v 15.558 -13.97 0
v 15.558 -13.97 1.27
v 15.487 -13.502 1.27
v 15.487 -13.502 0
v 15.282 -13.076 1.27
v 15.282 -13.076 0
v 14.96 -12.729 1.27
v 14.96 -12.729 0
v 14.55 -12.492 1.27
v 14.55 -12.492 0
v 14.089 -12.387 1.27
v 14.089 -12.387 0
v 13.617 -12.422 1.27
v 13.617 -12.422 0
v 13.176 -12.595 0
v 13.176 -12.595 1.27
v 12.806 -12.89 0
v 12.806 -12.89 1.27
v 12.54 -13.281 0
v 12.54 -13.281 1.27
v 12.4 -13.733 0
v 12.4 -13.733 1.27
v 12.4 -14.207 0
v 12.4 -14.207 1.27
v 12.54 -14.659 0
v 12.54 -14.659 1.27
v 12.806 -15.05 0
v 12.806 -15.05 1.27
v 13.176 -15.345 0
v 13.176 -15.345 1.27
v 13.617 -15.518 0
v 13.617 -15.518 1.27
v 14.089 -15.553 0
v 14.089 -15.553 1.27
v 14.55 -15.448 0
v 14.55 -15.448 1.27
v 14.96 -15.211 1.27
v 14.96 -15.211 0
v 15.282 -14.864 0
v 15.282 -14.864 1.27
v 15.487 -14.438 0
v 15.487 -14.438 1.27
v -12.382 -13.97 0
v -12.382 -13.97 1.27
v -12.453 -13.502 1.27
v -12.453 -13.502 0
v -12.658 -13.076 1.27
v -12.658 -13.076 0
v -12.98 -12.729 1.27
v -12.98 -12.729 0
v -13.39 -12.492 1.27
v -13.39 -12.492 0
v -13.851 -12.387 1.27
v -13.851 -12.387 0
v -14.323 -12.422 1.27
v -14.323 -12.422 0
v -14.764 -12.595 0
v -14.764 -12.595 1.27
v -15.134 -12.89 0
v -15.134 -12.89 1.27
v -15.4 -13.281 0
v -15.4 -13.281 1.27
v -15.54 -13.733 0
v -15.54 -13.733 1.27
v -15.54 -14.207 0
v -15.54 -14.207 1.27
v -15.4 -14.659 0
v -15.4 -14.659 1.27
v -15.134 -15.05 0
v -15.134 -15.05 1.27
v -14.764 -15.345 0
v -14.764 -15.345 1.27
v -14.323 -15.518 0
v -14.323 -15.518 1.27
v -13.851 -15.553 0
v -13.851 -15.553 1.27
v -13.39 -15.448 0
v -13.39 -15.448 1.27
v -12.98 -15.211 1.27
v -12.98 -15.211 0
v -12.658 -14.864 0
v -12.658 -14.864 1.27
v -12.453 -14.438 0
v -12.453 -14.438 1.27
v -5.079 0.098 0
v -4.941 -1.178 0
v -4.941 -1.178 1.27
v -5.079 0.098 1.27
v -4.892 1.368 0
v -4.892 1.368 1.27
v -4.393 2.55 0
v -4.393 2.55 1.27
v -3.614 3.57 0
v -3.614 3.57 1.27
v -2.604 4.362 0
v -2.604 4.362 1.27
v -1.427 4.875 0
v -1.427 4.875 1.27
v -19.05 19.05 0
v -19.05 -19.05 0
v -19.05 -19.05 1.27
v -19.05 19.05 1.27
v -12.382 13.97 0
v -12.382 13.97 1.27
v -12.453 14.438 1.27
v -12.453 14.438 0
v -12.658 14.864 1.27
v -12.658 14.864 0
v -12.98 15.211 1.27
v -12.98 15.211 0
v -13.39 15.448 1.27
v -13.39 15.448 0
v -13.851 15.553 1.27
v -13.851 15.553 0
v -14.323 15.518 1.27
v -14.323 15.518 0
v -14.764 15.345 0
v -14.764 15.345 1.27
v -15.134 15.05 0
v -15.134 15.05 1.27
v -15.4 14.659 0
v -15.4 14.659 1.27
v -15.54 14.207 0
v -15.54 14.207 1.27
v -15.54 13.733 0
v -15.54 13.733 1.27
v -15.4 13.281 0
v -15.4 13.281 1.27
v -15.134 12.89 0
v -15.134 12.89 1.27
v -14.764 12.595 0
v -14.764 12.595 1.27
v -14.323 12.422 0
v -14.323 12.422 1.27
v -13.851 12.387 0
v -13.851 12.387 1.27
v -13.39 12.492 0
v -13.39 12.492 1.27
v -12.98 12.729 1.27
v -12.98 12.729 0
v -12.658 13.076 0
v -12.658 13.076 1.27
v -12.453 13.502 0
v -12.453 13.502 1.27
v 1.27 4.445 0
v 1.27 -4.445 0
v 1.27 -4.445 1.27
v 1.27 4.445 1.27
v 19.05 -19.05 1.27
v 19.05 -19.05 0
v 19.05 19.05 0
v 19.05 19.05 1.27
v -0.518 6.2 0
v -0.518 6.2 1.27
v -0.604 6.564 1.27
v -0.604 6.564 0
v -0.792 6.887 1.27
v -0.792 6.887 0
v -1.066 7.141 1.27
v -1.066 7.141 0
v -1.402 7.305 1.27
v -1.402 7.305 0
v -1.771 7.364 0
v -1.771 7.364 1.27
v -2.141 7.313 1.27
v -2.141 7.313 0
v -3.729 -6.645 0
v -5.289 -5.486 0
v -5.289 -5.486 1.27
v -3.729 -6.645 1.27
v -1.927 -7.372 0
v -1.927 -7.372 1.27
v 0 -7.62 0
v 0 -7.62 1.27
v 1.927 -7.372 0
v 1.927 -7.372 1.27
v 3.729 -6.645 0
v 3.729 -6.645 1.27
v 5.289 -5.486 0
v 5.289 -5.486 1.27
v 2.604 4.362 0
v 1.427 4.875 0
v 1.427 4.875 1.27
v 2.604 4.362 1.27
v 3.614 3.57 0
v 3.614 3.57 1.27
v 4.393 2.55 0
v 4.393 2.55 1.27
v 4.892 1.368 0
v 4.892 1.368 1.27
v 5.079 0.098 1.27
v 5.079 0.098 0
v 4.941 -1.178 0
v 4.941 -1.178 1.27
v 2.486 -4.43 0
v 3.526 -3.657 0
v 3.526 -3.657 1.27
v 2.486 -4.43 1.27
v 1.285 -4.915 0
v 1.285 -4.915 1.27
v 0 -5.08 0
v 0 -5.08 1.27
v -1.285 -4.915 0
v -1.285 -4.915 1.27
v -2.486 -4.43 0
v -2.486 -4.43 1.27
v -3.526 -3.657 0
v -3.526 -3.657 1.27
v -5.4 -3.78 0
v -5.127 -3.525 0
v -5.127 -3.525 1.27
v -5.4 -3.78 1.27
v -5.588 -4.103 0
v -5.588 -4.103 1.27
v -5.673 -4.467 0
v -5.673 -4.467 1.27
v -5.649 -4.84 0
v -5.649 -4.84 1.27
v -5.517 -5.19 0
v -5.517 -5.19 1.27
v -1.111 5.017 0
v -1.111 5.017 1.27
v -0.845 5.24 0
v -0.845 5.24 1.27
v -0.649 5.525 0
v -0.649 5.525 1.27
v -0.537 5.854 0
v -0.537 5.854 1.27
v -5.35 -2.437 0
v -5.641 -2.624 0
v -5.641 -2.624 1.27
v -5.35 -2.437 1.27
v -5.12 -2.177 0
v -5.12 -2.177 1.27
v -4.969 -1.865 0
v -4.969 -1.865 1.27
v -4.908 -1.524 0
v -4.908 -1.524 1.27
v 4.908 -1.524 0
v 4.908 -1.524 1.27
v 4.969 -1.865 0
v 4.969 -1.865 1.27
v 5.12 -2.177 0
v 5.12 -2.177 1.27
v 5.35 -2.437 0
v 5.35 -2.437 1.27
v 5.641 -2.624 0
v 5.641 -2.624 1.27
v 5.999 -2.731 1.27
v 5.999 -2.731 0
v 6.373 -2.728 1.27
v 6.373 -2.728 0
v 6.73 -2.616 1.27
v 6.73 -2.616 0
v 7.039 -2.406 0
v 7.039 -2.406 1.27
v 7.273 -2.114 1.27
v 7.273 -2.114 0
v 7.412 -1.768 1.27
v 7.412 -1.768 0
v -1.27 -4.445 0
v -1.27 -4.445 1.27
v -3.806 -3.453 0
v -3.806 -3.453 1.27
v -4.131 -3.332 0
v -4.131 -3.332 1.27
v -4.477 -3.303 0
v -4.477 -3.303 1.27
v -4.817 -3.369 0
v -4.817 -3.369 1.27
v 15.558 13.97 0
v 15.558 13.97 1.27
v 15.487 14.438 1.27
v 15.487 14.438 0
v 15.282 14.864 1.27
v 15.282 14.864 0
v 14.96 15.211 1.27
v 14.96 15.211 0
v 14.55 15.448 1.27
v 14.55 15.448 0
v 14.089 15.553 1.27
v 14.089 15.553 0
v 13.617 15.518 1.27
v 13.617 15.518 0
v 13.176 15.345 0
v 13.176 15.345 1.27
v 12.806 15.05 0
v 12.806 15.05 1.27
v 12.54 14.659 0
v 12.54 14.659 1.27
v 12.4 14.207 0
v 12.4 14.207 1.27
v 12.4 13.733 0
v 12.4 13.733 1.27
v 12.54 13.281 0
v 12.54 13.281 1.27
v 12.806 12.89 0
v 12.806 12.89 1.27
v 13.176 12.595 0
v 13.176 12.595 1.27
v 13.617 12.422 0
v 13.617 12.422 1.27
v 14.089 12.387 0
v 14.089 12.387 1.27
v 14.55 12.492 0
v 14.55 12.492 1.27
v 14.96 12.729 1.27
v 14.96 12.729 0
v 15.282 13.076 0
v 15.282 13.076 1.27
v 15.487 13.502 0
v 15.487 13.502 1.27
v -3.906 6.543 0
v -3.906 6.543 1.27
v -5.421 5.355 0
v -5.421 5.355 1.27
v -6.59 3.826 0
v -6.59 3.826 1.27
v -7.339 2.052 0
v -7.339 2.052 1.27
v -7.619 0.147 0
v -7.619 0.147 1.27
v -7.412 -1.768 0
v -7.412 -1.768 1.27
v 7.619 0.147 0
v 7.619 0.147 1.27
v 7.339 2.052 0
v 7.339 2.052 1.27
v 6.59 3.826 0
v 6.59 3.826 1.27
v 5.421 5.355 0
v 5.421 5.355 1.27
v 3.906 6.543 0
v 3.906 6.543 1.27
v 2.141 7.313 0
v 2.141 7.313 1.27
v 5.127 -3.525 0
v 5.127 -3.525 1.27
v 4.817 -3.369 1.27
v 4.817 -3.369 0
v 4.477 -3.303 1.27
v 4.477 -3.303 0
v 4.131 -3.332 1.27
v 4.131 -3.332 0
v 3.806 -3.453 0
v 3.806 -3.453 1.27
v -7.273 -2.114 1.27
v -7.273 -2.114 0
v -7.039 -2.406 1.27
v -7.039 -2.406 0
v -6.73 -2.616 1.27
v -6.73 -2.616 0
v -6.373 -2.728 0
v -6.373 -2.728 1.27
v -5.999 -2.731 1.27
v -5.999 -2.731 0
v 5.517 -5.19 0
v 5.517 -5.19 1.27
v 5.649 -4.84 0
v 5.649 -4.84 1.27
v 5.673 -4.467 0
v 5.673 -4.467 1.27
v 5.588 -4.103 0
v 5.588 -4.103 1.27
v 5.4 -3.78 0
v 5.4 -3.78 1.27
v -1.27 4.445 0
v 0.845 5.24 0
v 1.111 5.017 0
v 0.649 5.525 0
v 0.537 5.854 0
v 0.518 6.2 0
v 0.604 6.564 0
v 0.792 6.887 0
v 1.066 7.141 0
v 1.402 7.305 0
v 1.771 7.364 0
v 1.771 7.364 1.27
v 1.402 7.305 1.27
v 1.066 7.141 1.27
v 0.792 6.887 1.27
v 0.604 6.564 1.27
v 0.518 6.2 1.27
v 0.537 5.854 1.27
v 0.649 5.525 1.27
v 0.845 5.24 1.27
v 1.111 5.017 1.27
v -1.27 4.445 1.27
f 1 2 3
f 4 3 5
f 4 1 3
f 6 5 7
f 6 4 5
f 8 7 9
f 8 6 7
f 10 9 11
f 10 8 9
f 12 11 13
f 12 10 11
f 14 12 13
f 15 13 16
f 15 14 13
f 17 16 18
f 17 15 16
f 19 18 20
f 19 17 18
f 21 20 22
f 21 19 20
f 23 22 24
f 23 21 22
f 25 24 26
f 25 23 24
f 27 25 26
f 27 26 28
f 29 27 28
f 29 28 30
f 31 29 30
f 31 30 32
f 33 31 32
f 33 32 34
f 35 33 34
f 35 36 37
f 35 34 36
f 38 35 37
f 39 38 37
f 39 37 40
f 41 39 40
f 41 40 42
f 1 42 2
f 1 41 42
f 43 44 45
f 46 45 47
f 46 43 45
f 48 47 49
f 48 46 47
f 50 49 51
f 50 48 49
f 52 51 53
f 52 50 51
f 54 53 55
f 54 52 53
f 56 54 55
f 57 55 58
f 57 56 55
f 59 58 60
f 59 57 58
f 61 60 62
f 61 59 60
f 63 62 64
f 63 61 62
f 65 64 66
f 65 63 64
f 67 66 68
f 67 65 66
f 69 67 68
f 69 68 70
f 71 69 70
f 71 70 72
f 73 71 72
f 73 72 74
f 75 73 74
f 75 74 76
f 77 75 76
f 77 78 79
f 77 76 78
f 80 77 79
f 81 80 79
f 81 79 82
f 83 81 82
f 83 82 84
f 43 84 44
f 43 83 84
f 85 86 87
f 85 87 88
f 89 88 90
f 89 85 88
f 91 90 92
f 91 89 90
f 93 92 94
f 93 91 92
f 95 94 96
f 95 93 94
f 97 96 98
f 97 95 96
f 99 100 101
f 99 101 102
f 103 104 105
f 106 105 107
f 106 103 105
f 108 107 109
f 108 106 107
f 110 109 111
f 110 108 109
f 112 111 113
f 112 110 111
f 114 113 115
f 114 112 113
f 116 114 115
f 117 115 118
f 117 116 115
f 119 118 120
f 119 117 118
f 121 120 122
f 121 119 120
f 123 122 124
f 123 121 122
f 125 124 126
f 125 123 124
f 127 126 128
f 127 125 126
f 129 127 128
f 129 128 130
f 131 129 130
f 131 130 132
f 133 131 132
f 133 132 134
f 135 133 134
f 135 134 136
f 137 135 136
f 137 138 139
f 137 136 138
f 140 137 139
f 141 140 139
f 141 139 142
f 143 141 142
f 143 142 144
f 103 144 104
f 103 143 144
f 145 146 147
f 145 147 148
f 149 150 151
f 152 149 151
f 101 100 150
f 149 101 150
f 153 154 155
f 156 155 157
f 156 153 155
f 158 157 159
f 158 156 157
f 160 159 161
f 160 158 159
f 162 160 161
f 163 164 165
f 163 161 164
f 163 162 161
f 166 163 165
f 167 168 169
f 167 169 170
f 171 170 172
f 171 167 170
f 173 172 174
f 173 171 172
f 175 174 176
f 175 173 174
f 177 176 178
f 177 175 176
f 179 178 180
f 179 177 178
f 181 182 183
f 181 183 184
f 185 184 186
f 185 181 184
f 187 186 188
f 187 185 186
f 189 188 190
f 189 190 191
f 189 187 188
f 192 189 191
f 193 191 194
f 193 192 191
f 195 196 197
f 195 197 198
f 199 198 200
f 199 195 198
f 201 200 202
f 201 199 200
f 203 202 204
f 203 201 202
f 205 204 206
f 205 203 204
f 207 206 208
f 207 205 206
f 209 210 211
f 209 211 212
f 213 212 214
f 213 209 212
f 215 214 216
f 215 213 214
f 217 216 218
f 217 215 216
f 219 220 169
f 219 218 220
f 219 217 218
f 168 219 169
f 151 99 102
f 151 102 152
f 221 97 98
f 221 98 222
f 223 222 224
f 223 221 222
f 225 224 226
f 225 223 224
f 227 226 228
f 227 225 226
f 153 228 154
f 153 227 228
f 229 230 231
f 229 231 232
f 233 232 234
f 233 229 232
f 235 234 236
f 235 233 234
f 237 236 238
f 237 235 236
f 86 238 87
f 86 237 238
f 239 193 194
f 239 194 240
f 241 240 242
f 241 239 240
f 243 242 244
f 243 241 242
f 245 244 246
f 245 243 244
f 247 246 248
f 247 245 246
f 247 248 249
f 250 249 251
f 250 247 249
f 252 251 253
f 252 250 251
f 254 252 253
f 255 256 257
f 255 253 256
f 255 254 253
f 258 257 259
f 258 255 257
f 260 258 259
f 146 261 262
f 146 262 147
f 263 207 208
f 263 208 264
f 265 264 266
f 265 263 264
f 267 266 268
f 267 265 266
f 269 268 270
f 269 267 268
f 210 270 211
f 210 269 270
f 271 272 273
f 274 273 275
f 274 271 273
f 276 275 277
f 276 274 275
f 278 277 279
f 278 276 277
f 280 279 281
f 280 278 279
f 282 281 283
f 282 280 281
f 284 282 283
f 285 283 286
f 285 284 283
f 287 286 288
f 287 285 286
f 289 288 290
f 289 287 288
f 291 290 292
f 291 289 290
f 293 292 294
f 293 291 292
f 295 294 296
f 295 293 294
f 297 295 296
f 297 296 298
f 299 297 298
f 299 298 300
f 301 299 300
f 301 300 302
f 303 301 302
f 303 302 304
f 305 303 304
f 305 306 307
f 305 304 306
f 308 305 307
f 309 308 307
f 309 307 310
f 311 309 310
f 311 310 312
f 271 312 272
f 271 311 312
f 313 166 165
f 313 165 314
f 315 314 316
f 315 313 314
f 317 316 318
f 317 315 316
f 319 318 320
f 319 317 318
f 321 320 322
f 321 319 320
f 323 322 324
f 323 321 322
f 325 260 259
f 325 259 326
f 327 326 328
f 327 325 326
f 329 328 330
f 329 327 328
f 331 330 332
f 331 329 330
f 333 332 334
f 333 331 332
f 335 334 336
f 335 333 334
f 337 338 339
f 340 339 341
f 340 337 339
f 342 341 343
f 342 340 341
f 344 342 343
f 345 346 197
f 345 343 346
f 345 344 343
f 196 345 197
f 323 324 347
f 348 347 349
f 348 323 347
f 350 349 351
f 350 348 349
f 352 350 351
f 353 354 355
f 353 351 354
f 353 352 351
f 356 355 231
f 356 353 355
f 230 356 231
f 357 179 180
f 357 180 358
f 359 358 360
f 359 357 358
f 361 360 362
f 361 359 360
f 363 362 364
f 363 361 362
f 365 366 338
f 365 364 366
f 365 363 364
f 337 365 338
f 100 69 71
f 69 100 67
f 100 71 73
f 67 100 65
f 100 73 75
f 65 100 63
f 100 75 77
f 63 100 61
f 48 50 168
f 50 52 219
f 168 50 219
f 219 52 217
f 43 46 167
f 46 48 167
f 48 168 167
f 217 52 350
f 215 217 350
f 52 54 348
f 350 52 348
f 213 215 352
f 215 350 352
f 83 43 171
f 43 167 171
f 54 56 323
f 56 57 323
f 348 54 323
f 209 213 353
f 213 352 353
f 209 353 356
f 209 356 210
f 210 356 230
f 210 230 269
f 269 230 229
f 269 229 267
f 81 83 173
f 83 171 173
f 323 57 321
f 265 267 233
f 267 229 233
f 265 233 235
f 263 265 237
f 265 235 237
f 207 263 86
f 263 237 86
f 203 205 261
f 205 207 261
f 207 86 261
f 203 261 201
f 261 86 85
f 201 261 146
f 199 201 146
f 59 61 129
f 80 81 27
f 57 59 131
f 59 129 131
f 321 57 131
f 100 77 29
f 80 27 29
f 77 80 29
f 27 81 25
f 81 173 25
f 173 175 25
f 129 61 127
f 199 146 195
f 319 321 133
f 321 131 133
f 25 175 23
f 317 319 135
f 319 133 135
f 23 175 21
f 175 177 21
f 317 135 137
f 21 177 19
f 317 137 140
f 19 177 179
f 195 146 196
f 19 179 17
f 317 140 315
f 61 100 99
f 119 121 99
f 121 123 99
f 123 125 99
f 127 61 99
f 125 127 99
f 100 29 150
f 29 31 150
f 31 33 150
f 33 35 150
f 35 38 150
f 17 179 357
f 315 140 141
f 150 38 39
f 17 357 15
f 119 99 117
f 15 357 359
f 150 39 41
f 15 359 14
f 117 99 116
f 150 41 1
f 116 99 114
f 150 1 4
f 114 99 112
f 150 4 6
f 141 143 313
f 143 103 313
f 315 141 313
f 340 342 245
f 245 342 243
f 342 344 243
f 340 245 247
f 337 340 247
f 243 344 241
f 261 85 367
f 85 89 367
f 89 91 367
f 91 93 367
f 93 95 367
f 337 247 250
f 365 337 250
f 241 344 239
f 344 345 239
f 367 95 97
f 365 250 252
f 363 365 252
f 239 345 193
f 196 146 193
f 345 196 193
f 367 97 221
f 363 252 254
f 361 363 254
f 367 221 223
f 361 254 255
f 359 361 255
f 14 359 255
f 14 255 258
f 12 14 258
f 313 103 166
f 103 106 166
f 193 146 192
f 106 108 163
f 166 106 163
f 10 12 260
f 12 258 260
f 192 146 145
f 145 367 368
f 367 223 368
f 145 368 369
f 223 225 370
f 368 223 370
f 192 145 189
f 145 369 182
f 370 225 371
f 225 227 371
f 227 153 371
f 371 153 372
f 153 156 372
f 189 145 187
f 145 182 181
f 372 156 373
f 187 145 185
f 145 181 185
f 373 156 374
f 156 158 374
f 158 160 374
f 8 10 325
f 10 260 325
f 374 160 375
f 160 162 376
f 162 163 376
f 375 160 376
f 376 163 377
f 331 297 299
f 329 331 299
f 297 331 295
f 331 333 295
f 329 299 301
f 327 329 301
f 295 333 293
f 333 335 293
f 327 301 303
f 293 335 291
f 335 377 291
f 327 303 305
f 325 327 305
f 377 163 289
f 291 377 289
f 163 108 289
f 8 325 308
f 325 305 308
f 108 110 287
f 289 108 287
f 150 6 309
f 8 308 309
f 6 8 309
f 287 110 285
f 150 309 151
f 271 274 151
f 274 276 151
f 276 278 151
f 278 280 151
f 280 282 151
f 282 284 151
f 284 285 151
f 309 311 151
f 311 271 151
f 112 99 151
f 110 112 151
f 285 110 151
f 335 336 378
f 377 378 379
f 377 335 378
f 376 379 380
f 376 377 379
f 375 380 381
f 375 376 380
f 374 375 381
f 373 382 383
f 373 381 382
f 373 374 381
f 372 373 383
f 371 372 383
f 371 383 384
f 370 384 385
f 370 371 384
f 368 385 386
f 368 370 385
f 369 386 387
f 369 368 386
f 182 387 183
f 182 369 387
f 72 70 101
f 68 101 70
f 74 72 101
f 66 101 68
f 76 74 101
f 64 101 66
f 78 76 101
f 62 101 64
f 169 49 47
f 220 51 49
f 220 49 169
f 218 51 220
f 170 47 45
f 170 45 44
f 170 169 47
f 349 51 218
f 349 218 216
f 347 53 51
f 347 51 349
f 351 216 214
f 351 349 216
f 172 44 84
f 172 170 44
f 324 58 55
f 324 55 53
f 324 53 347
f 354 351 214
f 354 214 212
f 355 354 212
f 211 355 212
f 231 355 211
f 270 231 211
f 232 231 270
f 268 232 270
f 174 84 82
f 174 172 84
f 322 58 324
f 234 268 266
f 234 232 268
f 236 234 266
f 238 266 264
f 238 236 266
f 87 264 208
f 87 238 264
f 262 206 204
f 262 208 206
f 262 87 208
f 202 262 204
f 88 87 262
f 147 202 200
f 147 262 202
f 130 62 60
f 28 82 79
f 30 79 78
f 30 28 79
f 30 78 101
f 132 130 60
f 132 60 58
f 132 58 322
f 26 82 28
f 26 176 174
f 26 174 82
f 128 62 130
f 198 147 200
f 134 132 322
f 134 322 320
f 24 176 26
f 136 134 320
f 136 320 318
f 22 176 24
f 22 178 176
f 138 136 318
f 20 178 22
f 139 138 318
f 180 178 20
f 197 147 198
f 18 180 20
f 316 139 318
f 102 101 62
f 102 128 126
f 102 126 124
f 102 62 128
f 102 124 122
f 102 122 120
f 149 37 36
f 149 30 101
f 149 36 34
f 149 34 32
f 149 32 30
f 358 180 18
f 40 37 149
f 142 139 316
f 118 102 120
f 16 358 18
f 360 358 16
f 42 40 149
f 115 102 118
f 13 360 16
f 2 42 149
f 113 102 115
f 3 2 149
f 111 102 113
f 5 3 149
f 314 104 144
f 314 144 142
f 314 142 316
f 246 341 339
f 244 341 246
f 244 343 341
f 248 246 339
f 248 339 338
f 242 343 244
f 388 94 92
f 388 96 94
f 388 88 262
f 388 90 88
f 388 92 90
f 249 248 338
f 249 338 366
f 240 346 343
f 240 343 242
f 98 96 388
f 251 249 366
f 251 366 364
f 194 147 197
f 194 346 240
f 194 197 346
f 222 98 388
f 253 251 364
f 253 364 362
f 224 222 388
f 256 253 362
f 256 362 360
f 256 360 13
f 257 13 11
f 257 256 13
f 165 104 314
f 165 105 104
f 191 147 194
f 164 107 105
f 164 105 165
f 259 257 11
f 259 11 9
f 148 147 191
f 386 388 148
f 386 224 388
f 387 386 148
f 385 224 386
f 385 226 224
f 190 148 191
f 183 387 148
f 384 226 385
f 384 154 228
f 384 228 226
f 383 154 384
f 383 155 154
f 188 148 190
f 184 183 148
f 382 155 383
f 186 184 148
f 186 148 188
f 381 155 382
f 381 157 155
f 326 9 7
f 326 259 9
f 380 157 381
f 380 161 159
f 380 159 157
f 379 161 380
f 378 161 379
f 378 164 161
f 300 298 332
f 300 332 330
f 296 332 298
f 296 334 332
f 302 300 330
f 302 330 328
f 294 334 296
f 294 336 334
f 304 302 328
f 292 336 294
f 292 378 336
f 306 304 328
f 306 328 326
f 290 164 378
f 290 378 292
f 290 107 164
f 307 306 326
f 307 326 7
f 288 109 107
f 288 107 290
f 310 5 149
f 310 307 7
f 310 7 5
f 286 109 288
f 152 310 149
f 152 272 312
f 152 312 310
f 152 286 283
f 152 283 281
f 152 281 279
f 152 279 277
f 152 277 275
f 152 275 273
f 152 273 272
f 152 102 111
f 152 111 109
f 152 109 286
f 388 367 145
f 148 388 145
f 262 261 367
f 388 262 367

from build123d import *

# Parameters (mm, degrees)
F0_W     = 38.1
F0_H     = 38.1
F1_DEPTH = 1.27
F3_DEPTH = 25.4
F4_R     = 1.5875
F4_W     = 2.54
F4_H     = 8.89
F5_DEPTH = 25.4


with BuildPart() as f1:
    # F0 (on Top) → F1 (new body)
    with BuildSketch(Plane.XY):
        Rectangle(F0_W, F0_H)
    extrude(amount=F1_DEPTH)

    # F2 (on Top) → F3 (cut)
    with BuildSketch(Plane.XY):
        with BuildLine():
            ThreePointArc((-0.518475, 6.200063), (-1.065611, 7.141481), (-2.14087, 7.313076))
            ThreePointArc((-2.14087, 7.313076), (-6.590117, 3.82554), (-7.412157, -1.767578))
            ThreePointArc((-7.412157, -1.767578), (-6.729914, -2.616206), (-5.641081, -2.624462))
            ThreePointArc((-5.641081, -2.624462), (-5.033573, -2.026098), (-4.941438, -1.178385))
            ThreePointArc((-4.941438, -1.178385), (-4.393411, 2.55036), (-1.427246, 4.875384))
            ThreePointArc((-1.427246, 4.875384), (-0.736807, 5.375783), (-0.518475, 6.200063))
        make_face()
        with BuildLine():
            ThreePointArc((5.641081, -2.624462), (6.729914, -2.616206), (7.412157, -1.767578))
            ThreePointArc((7.412157, -1.767578), (6.590117, 3.82554), (2.14087, 7.313076))
            ThreePointArc((2.14087, 7.313076), (1.065611, 7.141481), (0.518475, 6.200063))
            ThreePointArc((0.518475, 6.200063), (0.736807, 5.375783), (1.427246, 4.875384))
            ThreePointArc((1.427246, 4.875384), (4.393411, 2.55036), (4.941438, -1.178385))
            ThreePointArc((4.941438, -1.178385), (5.033573, -2.026098), (5.641081, -2.624462))
        make_face()
        with BuildLine():
            ThreePointArc((-5.126844, -3.524921), (-5.673013, -4.4669), (-5.288787, -5.485721))
            ThreePointArc((-5.288787, -5.485721), (0, -7.62), (5.288787, -5.485721))
            ThreePointArc((5.288787, -5.485721), (5.673013, -4.4669), (5.126844, -3.524921))
            ThreePointArc((5.126844, -3.524921), (4.302789, -3.305743), (3.525858, -3.657147))
            ThreePointArc((3.525858, -3.657147), (0, -5.08), (-3.525858, -3.657147))
            ThreePointArc((-3.525858, -3.657147), (-4.302789, -3.305743), (-5.126844, -3.524921))
        make_face()
    extrude(amount=F3_DEPTH, mode=Mode.SUBTRACT)

    # F4 (on Top) → F5 (cut)
    with BuildSketch(Plane.XY):
        with Locations((13.97, 13.97)):
            Circle(F4_R)
        with Locations((13.97, -13.97)):
            Circle(F4_R)
        with Locations((-13.97, -13.97)):
            Circle(F4_R)
        with Locations((-13.97, 13.97)):
            Circle(F4_R)
        Rectangle(F4_W, F4_H)
    extrude(amount=F5_DEPTH, mode=Mode.SUBTRACT)


solid = f1.part
